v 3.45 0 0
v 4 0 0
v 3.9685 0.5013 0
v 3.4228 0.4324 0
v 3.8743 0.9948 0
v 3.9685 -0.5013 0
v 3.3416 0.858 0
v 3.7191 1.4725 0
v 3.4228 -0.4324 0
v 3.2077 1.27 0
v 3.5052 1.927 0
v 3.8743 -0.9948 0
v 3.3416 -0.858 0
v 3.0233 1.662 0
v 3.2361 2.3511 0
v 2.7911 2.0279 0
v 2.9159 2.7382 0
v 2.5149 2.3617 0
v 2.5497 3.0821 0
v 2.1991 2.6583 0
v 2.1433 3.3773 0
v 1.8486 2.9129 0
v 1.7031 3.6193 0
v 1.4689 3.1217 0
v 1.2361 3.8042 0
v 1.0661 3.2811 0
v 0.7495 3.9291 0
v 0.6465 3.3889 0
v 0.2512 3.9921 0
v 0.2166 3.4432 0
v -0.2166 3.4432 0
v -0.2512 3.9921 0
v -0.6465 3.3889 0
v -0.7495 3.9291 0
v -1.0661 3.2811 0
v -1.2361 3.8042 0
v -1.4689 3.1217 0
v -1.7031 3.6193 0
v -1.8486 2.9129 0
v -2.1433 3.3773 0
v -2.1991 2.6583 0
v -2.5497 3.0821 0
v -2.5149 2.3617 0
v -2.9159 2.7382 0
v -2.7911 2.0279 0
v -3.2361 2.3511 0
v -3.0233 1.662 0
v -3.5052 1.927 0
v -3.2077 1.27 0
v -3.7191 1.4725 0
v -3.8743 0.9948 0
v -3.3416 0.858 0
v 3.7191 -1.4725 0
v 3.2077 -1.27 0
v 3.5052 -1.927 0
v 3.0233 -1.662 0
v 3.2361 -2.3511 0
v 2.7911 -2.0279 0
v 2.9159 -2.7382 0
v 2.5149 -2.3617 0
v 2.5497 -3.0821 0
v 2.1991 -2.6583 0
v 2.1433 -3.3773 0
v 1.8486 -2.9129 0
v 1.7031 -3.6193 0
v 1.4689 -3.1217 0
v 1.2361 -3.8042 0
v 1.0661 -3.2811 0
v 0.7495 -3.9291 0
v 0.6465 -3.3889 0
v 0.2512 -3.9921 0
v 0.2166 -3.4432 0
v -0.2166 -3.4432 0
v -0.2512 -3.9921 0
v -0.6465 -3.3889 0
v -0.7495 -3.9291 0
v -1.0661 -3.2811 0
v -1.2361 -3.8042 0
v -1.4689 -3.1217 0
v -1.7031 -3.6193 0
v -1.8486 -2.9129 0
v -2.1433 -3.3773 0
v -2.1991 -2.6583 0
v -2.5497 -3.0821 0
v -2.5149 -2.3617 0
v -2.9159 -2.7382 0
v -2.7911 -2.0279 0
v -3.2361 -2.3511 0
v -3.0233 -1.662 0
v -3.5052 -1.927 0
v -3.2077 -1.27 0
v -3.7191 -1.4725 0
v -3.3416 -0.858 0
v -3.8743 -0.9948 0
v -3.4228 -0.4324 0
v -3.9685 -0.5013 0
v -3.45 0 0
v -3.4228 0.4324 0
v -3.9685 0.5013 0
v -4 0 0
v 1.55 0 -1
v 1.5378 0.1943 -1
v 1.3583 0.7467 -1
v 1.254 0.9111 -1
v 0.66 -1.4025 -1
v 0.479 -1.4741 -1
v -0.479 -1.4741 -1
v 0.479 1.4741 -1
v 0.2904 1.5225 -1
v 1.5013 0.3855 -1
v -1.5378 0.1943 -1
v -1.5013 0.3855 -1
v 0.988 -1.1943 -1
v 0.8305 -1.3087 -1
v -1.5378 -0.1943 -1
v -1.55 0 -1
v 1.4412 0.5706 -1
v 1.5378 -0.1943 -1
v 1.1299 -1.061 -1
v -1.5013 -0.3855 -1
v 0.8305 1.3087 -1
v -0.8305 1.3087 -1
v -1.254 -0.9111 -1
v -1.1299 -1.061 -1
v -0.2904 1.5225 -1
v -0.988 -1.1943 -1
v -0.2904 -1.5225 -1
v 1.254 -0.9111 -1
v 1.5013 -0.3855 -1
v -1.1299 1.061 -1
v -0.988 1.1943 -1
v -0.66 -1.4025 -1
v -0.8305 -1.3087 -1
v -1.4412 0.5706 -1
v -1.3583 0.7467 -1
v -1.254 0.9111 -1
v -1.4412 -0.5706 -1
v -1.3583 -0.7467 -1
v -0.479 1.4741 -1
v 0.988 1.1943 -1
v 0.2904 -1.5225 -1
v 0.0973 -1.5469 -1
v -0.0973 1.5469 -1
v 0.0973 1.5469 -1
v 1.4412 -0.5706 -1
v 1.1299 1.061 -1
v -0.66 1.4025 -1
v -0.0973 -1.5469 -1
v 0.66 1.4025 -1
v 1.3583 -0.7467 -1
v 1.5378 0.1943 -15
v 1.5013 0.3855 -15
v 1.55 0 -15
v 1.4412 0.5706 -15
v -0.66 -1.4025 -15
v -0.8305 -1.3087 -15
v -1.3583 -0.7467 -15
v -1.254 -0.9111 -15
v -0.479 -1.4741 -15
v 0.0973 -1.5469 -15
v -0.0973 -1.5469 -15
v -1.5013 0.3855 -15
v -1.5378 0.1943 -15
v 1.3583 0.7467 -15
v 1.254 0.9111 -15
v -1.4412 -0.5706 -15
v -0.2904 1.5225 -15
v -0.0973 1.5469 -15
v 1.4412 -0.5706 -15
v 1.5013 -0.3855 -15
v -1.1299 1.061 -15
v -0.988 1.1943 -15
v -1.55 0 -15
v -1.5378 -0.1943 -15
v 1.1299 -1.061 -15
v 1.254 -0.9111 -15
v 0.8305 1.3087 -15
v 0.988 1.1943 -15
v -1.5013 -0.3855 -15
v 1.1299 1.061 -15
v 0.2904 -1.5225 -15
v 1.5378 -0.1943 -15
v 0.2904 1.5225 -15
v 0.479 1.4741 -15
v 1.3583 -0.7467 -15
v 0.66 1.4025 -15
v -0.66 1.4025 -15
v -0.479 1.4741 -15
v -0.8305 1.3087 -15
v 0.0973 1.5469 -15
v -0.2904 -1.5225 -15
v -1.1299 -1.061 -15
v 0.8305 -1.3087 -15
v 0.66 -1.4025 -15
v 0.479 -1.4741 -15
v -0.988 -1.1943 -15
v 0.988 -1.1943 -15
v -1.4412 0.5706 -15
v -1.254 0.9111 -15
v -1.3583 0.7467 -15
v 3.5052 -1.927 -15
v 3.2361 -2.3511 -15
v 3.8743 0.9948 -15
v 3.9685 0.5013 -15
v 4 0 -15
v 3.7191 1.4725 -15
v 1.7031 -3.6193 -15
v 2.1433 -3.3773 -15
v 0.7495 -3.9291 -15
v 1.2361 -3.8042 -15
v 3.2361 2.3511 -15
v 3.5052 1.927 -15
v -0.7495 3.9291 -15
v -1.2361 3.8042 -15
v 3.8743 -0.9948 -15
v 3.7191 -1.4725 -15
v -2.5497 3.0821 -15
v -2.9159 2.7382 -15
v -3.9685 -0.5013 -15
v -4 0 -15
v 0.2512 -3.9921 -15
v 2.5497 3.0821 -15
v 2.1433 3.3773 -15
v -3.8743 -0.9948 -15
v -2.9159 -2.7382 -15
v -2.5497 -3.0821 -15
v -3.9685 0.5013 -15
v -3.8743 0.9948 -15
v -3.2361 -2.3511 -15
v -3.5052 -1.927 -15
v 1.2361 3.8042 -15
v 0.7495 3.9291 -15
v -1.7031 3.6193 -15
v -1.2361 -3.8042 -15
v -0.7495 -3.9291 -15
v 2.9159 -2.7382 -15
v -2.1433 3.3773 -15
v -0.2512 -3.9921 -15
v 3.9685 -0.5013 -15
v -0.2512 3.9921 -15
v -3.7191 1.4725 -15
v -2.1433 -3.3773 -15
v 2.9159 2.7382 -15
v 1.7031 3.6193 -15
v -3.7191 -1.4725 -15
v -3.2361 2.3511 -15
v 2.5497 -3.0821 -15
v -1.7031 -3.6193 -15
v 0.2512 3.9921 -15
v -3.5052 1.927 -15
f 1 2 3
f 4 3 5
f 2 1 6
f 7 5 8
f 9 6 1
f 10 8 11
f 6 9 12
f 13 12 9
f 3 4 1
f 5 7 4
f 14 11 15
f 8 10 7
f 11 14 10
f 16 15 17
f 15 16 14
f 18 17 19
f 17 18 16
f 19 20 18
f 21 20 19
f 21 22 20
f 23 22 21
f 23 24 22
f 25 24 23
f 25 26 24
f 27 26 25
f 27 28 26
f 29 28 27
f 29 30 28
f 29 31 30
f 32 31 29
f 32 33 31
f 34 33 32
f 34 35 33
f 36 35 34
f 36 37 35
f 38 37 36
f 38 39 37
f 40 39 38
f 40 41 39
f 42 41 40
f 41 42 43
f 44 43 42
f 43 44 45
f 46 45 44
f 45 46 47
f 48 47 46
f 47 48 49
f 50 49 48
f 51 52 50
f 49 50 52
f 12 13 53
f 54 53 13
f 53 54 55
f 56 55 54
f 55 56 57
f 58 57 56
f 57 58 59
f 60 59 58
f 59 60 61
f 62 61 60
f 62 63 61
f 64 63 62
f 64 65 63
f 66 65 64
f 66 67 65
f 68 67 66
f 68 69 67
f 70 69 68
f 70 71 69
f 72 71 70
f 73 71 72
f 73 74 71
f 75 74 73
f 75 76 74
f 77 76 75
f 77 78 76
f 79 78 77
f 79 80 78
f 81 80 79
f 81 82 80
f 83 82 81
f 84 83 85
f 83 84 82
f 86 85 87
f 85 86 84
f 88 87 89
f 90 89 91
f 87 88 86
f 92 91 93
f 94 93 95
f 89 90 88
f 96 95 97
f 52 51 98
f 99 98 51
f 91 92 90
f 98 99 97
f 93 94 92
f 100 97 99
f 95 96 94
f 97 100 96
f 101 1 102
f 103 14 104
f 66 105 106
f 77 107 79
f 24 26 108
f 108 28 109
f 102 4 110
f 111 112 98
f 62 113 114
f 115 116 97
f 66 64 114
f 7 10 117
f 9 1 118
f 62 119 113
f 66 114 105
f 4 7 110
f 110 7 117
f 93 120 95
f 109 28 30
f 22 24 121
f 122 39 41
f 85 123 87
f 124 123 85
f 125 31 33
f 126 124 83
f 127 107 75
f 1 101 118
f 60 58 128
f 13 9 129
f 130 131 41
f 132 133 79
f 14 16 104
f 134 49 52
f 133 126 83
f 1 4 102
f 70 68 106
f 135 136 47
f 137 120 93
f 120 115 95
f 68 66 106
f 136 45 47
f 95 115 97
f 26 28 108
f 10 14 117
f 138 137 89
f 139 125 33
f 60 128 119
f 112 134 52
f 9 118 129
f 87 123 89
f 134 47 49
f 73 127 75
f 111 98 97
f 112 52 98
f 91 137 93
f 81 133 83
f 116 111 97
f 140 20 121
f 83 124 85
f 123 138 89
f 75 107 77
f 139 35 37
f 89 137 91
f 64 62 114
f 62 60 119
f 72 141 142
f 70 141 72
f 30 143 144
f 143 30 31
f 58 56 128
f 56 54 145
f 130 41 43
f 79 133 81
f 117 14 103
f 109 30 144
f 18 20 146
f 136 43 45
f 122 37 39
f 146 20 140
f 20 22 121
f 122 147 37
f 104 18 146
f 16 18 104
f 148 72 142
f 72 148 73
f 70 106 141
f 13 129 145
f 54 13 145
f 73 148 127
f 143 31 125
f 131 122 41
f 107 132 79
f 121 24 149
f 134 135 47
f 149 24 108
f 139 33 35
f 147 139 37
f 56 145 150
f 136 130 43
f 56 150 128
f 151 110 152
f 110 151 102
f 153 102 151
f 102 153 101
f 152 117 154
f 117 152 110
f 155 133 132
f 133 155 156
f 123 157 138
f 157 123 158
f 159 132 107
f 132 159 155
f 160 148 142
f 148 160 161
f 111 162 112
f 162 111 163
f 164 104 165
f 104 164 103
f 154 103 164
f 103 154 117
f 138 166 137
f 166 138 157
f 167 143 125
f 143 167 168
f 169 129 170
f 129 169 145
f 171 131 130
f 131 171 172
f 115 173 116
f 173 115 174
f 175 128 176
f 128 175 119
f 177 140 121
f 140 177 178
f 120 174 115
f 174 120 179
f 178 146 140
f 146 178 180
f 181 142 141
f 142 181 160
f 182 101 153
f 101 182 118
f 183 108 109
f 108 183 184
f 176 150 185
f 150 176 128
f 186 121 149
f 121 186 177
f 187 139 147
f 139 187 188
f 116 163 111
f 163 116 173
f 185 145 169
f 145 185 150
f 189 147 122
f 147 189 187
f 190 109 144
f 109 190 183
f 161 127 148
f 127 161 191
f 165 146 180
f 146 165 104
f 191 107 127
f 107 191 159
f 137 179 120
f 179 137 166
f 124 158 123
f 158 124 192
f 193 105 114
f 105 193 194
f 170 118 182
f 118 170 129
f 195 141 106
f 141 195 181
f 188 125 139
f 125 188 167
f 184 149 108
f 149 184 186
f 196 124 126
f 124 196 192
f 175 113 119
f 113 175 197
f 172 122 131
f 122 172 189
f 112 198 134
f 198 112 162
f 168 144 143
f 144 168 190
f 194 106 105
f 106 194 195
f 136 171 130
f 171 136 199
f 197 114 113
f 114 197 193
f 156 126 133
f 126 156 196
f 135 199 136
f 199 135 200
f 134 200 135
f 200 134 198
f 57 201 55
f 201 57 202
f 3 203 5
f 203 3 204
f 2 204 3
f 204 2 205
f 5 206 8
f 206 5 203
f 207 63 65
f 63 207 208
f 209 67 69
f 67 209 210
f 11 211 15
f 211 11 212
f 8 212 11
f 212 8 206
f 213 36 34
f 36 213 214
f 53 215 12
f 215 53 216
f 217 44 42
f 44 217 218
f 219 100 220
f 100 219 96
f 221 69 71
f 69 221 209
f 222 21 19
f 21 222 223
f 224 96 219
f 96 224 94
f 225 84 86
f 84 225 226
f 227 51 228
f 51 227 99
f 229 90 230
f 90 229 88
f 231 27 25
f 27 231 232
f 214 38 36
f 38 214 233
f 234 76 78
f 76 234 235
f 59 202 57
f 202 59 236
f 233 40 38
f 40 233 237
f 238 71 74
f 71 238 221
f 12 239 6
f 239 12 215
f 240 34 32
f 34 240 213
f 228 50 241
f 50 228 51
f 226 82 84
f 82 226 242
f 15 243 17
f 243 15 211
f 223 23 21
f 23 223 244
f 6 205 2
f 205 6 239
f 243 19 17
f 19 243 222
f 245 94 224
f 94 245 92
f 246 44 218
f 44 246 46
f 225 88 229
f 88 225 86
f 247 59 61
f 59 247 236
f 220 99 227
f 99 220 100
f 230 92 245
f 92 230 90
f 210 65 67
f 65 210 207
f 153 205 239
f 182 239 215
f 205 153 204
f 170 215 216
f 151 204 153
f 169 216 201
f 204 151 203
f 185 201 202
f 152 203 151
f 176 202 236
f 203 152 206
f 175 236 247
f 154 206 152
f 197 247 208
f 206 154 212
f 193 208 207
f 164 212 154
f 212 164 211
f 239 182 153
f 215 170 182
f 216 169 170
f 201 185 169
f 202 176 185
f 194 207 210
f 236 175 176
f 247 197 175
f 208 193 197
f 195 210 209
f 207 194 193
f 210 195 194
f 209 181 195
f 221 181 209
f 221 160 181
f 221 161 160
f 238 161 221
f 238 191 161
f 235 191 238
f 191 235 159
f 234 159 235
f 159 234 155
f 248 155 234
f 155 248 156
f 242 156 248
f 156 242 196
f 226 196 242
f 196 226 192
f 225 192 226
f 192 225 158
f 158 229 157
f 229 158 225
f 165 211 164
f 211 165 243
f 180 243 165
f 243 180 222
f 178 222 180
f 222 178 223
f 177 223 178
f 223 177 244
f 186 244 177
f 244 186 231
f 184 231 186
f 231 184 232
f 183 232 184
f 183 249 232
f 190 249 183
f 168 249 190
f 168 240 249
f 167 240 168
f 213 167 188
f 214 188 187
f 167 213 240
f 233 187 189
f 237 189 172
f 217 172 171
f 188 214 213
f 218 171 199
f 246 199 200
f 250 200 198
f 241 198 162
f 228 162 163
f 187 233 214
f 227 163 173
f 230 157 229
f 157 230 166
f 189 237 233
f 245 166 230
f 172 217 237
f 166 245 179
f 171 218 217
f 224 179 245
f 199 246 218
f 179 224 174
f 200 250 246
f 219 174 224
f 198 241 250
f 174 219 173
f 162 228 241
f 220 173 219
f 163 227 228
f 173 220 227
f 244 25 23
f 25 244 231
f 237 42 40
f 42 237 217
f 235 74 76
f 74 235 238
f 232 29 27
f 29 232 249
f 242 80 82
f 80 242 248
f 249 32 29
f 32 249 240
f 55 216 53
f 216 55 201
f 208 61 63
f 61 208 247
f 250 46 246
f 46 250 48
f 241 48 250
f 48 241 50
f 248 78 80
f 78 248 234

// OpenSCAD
$fn = 50;

difference() {
	union() {
		translate(v = [0, 0, -15.0]) {
			cylinder(h = 18, r = 4.0);
		}
	}
	union() {
		translate(v = [0, 0, 0]) {
			rotate(a = [0, 0, 0]) {
				difference() {
					union() {
						translate(v = [0, 0, -18.0]) {
							cylinder(h = 18, r = 1.25);
						}
						translate(v = [0, 0, -1.0]) {
							cylinder(h = 1.0, r1 = 1.55, r2 = 3.45);
						}
						translate(v = [0, 0, -18.0]) {
							cylinder(h = 18, r = 1.55);
						}
						translate(v = [0, 0, -18.0]) {
							cylinder(h = 18, r = 1.25);
						}
					}
					union();
				}
			}
		}
		#cylinder(h = 3, r = 5.0);
	}
}
